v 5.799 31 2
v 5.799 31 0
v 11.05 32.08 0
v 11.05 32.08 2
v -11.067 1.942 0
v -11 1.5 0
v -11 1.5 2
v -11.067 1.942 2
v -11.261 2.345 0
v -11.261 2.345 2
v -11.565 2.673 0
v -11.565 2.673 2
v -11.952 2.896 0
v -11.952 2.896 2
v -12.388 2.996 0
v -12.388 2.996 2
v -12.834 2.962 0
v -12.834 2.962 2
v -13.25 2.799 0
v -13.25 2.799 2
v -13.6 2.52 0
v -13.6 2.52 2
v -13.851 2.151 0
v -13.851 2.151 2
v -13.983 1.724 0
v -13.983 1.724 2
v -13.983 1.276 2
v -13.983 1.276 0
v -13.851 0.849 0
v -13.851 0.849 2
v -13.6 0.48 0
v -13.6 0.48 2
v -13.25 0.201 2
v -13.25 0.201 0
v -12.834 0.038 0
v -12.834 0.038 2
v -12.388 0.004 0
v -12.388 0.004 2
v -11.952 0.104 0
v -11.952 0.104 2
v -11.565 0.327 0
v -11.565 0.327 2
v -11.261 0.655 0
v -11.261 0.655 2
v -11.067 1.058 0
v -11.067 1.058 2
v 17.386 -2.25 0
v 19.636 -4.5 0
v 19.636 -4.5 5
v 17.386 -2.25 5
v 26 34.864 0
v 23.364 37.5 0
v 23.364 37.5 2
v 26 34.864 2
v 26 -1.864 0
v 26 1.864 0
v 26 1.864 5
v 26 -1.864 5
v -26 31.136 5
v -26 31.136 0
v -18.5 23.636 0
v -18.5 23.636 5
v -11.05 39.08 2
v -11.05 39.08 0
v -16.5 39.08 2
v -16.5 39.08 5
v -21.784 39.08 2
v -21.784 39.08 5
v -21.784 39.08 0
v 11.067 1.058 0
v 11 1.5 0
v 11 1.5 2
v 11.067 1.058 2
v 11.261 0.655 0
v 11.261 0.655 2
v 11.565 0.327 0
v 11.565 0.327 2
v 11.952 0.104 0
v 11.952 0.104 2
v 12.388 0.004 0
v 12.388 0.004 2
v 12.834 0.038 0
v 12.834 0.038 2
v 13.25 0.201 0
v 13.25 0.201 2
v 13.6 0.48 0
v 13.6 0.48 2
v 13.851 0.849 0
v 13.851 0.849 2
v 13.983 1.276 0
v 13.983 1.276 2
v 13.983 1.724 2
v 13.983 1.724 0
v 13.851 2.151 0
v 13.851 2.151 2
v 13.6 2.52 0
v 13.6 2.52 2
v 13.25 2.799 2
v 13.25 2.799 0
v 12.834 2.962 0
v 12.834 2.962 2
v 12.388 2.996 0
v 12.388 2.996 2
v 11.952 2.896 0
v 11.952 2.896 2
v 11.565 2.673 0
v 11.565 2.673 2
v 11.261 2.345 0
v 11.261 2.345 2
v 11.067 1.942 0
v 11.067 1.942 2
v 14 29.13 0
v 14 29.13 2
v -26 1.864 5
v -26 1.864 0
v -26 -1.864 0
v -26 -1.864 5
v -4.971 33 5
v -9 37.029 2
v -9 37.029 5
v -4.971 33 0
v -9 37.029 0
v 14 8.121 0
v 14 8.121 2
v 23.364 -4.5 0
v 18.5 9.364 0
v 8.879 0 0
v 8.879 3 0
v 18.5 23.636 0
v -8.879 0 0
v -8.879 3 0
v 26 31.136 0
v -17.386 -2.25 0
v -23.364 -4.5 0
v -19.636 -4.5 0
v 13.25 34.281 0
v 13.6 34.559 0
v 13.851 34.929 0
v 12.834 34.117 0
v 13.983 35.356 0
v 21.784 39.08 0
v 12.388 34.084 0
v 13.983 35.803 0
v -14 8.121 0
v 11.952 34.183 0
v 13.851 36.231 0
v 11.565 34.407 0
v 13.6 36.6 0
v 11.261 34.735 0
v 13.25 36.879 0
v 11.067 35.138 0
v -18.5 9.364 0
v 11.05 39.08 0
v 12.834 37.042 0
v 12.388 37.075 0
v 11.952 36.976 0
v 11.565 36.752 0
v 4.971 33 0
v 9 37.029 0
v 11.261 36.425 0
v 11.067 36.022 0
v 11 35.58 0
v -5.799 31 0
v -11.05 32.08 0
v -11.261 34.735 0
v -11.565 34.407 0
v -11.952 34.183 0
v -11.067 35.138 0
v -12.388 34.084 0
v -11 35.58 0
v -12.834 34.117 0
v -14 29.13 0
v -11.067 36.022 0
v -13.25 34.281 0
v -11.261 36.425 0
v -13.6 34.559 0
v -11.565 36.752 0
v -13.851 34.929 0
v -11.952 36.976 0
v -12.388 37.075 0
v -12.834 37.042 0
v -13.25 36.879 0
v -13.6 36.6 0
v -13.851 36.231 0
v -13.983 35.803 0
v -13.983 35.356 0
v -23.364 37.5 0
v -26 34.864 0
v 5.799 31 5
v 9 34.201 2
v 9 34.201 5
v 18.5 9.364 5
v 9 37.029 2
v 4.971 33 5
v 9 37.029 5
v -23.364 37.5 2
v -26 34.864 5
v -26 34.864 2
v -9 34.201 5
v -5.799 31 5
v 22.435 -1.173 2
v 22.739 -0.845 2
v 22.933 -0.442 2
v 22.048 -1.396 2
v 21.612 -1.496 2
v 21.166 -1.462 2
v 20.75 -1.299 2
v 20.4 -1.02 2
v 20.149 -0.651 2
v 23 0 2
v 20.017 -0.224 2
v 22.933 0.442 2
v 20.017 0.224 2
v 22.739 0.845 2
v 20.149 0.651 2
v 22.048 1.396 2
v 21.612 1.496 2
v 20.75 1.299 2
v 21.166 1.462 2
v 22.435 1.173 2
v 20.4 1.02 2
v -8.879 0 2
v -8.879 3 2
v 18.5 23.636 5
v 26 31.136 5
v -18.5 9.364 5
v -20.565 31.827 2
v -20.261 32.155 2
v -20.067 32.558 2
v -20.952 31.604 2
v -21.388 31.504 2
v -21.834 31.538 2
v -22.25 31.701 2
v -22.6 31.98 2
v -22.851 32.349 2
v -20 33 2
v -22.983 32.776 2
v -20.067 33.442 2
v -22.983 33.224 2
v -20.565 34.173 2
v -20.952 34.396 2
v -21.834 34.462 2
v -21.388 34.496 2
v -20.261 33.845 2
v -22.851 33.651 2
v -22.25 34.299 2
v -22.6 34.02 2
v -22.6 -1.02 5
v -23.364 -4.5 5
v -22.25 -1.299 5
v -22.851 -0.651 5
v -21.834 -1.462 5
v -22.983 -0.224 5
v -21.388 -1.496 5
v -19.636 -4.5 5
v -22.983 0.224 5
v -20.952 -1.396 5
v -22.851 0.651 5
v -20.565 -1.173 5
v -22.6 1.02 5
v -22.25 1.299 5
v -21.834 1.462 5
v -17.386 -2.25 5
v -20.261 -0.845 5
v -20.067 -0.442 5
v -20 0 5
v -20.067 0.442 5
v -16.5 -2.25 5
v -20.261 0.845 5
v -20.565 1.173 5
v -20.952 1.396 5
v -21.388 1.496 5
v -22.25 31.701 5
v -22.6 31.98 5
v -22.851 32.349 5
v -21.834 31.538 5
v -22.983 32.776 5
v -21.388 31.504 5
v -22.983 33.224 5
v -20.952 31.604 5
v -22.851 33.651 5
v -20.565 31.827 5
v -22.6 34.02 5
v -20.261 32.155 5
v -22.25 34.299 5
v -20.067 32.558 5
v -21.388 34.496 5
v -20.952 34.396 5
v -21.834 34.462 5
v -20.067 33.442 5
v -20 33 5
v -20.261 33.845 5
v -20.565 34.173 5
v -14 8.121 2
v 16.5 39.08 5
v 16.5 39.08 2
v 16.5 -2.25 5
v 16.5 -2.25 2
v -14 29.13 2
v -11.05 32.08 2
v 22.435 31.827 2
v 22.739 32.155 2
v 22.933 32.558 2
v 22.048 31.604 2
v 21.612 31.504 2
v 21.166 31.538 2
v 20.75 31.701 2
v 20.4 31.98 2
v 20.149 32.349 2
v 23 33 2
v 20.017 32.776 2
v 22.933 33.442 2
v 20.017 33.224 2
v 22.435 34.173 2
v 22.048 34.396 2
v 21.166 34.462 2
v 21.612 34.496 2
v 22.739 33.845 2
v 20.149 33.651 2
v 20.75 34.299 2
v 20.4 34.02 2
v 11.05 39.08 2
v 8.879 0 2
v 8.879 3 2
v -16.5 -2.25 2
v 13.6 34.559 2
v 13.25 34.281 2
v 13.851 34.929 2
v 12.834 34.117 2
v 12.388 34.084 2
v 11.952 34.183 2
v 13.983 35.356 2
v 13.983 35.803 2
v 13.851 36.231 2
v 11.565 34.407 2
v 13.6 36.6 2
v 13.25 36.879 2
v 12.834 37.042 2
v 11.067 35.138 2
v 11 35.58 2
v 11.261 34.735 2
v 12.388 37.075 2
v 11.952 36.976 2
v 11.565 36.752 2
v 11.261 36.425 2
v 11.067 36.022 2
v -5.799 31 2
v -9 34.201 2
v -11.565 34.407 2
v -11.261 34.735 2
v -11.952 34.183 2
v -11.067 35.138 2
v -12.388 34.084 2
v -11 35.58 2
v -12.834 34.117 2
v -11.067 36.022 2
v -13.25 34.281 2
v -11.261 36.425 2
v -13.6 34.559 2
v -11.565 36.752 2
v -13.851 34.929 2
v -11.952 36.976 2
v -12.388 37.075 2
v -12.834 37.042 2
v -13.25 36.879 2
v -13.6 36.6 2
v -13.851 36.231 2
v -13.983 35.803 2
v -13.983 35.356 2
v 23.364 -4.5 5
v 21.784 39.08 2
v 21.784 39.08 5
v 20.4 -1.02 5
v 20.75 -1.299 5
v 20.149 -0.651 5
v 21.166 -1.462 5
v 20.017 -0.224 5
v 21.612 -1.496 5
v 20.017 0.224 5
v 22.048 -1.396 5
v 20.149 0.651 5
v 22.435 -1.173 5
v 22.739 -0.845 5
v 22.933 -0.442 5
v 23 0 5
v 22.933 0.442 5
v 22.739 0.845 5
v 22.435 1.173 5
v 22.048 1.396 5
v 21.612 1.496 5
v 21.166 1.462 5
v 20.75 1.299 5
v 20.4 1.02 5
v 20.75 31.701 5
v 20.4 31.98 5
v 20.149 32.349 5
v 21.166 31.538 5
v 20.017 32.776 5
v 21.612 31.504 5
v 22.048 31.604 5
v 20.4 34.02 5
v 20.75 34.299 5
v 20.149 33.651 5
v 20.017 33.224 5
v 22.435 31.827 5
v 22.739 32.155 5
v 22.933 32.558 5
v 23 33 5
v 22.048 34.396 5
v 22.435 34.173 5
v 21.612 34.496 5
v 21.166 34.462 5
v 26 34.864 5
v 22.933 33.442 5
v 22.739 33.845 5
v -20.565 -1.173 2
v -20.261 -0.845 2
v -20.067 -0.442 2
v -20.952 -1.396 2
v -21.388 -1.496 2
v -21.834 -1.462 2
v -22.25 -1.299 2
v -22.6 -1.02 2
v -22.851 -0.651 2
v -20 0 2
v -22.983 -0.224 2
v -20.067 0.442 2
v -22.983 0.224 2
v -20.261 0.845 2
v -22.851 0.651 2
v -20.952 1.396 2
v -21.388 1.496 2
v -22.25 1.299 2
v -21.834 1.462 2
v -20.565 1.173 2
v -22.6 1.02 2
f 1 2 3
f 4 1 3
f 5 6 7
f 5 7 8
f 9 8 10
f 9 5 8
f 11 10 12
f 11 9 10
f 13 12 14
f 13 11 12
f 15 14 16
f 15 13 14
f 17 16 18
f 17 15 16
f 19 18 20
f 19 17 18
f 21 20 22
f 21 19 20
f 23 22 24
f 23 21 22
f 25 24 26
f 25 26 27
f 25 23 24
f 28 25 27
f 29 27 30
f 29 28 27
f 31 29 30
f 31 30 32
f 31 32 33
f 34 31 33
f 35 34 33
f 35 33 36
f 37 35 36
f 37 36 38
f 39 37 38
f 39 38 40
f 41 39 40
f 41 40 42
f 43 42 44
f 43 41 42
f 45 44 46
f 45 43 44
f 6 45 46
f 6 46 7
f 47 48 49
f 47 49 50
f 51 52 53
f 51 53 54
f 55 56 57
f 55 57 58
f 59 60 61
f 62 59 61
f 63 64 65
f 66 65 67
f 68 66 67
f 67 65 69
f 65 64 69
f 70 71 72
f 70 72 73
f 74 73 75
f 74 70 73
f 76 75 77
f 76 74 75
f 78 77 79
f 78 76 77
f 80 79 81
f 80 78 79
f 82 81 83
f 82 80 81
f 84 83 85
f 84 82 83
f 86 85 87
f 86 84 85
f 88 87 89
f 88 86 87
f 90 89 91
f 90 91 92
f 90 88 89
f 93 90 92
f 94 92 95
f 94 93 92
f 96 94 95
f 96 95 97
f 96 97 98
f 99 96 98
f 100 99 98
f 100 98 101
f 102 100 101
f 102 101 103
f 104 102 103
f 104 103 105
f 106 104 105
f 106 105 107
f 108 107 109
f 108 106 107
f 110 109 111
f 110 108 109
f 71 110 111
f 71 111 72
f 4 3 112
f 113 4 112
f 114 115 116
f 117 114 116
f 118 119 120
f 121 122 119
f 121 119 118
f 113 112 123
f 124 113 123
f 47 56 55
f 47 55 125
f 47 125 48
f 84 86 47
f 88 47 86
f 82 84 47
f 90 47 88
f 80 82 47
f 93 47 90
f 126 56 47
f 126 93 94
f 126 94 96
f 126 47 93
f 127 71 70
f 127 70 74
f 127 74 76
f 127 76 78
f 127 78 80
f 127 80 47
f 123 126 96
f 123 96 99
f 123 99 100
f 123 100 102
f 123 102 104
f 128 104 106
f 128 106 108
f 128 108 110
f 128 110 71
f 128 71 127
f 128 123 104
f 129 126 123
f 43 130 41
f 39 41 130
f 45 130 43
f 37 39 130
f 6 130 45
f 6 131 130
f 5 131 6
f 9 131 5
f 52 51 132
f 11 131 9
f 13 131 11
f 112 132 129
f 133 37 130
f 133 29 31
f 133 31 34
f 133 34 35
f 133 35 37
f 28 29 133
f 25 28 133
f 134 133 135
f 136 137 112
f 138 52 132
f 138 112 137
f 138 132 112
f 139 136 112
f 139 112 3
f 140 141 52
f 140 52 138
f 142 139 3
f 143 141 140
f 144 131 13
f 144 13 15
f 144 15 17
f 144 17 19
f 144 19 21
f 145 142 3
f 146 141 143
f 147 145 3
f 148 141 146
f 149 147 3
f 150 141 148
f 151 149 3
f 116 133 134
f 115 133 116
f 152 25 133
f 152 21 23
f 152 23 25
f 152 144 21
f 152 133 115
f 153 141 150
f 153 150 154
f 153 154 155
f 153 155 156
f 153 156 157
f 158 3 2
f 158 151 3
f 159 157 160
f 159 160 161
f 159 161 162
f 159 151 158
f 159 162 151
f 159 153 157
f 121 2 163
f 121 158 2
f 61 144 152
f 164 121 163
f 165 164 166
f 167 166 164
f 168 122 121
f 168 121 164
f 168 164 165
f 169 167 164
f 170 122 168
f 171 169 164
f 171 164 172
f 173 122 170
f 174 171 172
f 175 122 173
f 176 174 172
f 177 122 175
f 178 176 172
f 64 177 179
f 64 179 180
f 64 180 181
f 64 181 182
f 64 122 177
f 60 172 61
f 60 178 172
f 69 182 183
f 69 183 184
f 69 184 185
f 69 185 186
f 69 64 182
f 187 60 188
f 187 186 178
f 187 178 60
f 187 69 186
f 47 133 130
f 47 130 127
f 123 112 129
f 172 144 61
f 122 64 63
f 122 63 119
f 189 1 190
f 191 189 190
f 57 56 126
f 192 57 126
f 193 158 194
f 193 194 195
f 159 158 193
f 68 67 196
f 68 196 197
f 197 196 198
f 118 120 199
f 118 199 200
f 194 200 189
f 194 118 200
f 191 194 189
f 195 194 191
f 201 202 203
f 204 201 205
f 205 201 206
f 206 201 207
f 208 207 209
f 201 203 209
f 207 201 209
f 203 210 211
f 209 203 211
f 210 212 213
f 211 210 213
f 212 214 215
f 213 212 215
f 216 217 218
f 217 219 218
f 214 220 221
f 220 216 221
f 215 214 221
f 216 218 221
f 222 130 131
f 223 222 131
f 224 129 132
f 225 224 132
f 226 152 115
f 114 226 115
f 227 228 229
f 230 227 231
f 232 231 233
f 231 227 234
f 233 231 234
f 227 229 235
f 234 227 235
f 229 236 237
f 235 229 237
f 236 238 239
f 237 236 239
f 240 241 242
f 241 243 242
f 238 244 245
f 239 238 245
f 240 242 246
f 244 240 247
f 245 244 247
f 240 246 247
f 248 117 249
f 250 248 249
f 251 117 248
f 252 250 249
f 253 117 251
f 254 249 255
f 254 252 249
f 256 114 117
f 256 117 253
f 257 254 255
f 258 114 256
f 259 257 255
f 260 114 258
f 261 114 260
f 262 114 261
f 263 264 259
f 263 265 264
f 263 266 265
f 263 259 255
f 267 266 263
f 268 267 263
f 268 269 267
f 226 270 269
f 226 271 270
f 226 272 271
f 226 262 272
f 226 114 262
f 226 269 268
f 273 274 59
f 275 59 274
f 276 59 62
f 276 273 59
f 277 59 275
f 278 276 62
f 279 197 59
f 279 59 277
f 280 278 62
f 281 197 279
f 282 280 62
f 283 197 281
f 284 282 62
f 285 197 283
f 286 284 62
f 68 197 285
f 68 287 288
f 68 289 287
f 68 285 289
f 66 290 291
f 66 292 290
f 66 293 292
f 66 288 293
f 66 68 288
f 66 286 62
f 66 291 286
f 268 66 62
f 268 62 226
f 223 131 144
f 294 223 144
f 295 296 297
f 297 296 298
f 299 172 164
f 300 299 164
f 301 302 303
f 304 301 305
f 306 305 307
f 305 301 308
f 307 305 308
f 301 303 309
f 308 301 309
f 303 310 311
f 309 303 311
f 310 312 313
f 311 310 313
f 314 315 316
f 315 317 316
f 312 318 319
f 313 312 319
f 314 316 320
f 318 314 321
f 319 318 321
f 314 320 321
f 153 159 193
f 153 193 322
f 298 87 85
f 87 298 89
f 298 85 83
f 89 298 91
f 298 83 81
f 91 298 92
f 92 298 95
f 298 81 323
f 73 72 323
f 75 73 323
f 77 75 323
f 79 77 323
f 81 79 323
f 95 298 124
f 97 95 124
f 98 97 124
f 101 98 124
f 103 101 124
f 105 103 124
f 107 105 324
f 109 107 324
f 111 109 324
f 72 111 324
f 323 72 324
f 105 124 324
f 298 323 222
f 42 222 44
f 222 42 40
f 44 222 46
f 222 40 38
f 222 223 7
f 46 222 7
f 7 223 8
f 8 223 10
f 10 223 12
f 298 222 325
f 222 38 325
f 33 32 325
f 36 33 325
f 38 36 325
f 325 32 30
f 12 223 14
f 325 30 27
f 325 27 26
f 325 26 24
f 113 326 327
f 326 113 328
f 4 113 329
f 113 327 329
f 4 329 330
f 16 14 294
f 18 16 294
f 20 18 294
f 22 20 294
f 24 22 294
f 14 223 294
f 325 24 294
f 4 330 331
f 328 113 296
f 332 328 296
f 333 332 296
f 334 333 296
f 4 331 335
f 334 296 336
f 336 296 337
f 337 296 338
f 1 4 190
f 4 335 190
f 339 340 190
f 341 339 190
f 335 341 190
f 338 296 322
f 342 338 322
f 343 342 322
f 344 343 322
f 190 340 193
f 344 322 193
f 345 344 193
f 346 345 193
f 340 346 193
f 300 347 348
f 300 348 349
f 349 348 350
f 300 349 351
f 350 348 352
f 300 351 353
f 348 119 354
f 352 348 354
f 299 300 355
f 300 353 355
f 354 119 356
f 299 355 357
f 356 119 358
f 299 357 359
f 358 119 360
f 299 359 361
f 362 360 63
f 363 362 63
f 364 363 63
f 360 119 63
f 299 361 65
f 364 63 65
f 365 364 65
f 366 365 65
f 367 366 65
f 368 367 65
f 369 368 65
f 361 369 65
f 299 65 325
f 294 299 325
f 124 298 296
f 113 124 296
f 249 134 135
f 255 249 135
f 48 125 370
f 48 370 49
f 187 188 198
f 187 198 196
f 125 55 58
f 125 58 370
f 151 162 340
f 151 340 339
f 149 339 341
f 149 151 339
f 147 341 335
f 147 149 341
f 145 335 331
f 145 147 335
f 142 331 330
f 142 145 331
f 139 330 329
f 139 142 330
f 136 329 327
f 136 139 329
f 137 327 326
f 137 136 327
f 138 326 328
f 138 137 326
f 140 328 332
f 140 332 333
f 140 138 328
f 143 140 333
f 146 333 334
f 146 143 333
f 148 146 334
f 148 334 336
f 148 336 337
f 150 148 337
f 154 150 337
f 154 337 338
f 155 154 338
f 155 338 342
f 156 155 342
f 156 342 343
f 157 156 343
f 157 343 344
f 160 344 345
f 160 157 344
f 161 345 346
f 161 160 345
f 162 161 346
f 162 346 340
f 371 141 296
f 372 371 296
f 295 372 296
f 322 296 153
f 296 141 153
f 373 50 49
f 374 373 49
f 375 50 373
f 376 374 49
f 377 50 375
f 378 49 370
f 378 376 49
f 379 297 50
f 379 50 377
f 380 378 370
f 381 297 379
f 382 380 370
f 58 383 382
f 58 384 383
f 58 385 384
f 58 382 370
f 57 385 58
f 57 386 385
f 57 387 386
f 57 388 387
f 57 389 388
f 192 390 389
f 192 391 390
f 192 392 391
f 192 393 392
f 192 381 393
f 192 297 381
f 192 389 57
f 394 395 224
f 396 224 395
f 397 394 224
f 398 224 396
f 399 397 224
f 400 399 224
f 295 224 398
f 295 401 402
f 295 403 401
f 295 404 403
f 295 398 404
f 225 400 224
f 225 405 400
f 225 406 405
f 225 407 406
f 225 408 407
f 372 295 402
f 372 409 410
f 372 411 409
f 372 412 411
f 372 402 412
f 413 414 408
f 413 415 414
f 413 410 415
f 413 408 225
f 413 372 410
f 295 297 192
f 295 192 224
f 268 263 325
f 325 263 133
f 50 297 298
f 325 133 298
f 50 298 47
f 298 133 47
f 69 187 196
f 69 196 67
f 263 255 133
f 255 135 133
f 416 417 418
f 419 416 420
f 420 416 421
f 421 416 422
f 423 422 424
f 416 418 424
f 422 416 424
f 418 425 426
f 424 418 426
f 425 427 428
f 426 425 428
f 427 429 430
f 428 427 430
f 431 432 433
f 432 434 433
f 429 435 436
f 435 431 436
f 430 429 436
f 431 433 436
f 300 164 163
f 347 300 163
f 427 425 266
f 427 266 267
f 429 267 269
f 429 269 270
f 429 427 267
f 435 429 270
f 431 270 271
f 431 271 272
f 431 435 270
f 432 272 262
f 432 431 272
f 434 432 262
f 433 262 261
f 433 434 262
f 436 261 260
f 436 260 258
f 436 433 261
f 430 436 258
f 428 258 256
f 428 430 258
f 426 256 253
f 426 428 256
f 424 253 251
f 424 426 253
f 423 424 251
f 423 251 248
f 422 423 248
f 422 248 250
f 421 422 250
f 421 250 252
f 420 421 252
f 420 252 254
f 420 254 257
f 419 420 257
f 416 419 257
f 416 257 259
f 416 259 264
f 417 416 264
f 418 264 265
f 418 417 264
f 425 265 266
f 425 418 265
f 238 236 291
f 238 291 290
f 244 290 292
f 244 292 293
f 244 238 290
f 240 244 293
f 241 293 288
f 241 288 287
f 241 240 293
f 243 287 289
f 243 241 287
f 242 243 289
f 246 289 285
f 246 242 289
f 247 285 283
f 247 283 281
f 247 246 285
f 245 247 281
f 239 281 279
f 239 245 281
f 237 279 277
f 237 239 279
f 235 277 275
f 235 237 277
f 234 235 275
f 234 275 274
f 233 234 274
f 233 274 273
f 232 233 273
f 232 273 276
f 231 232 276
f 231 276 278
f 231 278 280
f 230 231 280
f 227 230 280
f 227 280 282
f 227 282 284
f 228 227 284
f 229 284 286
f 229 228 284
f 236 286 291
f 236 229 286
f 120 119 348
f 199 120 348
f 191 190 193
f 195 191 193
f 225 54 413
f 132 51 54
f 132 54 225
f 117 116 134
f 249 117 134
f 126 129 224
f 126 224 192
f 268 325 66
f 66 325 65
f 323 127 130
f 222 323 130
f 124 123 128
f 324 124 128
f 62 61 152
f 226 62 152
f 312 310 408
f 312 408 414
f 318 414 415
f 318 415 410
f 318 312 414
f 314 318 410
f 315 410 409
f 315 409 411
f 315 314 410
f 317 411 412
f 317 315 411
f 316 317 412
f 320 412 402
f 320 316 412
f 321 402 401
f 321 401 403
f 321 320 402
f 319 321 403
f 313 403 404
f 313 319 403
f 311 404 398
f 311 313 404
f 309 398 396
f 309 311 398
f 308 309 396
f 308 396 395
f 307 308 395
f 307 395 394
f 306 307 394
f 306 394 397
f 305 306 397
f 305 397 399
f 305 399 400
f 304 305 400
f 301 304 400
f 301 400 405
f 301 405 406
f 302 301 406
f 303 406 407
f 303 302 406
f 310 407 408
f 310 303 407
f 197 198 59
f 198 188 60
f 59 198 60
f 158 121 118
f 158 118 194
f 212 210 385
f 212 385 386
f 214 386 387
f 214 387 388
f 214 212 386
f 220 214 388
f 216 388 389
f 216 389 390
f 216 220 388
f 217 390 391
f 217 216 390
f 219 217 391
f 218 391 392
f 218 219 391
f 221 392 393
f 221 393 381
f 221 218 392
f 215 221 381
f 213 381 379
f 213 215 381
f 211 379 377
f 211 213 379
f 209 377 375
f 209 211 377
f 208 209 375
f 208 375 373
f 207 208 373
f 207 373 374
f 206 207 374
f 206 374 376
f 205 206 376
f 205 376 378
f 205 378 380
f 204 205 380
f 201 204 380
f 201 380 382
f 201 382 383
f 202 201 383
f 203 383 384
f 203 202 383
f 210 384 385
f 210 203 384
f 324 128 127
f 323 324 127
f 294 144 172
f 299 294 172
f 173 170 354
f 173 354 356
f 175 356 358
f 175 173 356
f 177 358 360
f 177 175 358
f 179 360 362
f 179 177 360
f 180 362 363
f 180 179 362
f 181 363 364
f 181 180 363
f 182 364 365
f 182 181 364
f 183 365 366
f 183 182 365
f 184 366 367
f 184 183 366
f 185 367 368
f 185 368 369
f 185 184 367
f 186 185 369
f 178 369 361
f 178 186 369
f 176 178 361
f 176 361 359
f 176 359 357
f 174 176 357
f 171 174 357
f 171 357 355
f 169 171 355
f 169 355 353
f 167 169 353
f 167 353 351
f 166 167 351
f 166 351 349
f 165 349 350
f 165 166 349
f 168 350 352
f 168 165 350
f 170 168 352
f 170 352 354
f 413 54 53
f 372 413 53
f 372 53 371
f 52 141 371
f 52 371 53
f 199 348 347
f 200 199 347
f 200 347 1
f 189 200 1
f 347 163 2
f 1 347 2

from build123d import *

# Parameters (mm, degrees)
SKETCH11_R          = 1.5
BOSS_EXTRUDE4_DEPTH = 2
SKETCH12_R          = 1.5
BOSS_EXTRUDE5_DEPTH = 3


with BuildPart() as part:
    # Sketch11 → Boss-Extrude4 (new body)
    with BuildSketch(Plane.XY):
        Polygon((16.5, -2.25), (-16.5, -2.25), (-17.386038969, -2.25), (-19.636038969, -4.5), (-23.363961031, -4.5), (-26, -1.863961031), (-26, 1.863961031), (-23.363961031, 4.5), (-18.5, 9.363961031), (-18.5, 23.636038969), (-23.363961031, 28.5), (-26, 31.136038969), (-26, 34.863961031), (-23.363961031, 37.5), (-21.784271247, 39.079689783), (-13.949747468, 39.079689783), (-11.050252532, 39.079689783), (-9, 37.029437252), (-4.970562748, 33), (4.970562748, 33), (9, 37.029437252), (11.050252532, 39.079689783), (13.949747468, 39.079689783), (21.784271247, 39.079689783), (23.363961031, 37.5), (26, 34.863961031), (26, 31.136038969), (23.363961031, 28.5), (18.5, 23.636038969), (18.5, 9.363961031), (23.363961031, 4.5), (26, 1.863961031), (26, -1.863961031), (23.363961031, -4.5), (19.636038969, -4.5), (17.386038969, -2.25), align=None)
        with Locations((-12.5, 1.5)):
            Circle(SKETCH11_R, mode=Mode.SUBTRACT)
        with Locations((-12.5, 35.579689783)):
            Circle(SKETCH11_R, mode=Mode.SUBTRACT)
        with Locations(Location((12.5, 35.579689783, 0), (0, 0, 180))):
            Circle(SKETCH11_R, mode=Mode.SUBTRACT)
        with Locations(Location((12.5, 1.5, 0), (0, 0, 180))):
            Circle(SKETCH11_R, mode=Mode.SUBTRACT)
        Polygon((8.878679656, 0), (-8.878679656, 0), (-8.878679656, 3), (-11, 5.121320344), (-14, 8.121320344), (-14, 29.129942315), (-11.050252532, 32.079689783), (-5.798989873, 31), (5.798989873, 31), (11.050252532, 32.079689783), (14, 29.129942315), (14, 8.121320344), (11, 5.121320344), (8.878679656, 3), align=None, mode=Mode.SUBTRACT)
    extrude(amount=BOSS_EXTRUDE4_DEPTH)

    # Sketch12 → Boss-Extrude5 (add)
    # profile 1 of 3: a face of its own
    with BuildSketch(Plane.XY.offset(2)):
        Polygon((-23.363961031, -4.5), (-19.636038969, -4.5), (-17.386038969, -2.25), (-16.5, -2.25), (-16.5, 39.079689783), (-21.784271247, 39.079689783), (-26, 34.863961031), (-26, 31.136038969), (-18.5, 23.636038969), (-18.5, 9.363961031), (-26, 1.863961031), (-26, -1.863961031), align=None)
        with Locations((-21.5, 0)):
            Circle(SKETCH12_R, mode=Mode.SUBTRACT)
        with Locations((-21.5, 33)):
            Circle(SKETCH12_R, mode=Mode.SUBTRACT)
    # profile 2 of 3: a face of its own
    with BuildSketch(Plane.XY.offset(2)):
        Polygon((-9, 37.029437252), (-9, 34.201010127), (-5.798989873, 31), (5.798989873, 31), (9, 34.201010127), (9, 37.029437252), (4.970562748, 33), (-4.970562748, 33), align=None)
    # profile 3 of 3: a face of its own
    with BuildSketch(Plane.XY.offset(2)):
        Polygon((16.5, 39.079689783), (16.5, -2.25), (17.386038969, -2.25), (19.636038969, -4.5), (23.363961031, -4.5), (26, -1.863961031), (26, 1.863961031), (18.5, 9.363961031), (18.5, 23.636038969), (26, 31.136038969), (26, 34.863961031), (21.784271247, 39.079689783), align=None)
        with Locations((21.5, 0)):
            Circle(SKETCH12_R, mode=Mode.SUBTRACT)
        with Locations((21.5, 33)):
            Circle(SKETCH12_R, mode=Mode.SUBTRACT)
    extrude(amount=BOSS_EXTRUDE5_DEPTH)


solid = part.part
